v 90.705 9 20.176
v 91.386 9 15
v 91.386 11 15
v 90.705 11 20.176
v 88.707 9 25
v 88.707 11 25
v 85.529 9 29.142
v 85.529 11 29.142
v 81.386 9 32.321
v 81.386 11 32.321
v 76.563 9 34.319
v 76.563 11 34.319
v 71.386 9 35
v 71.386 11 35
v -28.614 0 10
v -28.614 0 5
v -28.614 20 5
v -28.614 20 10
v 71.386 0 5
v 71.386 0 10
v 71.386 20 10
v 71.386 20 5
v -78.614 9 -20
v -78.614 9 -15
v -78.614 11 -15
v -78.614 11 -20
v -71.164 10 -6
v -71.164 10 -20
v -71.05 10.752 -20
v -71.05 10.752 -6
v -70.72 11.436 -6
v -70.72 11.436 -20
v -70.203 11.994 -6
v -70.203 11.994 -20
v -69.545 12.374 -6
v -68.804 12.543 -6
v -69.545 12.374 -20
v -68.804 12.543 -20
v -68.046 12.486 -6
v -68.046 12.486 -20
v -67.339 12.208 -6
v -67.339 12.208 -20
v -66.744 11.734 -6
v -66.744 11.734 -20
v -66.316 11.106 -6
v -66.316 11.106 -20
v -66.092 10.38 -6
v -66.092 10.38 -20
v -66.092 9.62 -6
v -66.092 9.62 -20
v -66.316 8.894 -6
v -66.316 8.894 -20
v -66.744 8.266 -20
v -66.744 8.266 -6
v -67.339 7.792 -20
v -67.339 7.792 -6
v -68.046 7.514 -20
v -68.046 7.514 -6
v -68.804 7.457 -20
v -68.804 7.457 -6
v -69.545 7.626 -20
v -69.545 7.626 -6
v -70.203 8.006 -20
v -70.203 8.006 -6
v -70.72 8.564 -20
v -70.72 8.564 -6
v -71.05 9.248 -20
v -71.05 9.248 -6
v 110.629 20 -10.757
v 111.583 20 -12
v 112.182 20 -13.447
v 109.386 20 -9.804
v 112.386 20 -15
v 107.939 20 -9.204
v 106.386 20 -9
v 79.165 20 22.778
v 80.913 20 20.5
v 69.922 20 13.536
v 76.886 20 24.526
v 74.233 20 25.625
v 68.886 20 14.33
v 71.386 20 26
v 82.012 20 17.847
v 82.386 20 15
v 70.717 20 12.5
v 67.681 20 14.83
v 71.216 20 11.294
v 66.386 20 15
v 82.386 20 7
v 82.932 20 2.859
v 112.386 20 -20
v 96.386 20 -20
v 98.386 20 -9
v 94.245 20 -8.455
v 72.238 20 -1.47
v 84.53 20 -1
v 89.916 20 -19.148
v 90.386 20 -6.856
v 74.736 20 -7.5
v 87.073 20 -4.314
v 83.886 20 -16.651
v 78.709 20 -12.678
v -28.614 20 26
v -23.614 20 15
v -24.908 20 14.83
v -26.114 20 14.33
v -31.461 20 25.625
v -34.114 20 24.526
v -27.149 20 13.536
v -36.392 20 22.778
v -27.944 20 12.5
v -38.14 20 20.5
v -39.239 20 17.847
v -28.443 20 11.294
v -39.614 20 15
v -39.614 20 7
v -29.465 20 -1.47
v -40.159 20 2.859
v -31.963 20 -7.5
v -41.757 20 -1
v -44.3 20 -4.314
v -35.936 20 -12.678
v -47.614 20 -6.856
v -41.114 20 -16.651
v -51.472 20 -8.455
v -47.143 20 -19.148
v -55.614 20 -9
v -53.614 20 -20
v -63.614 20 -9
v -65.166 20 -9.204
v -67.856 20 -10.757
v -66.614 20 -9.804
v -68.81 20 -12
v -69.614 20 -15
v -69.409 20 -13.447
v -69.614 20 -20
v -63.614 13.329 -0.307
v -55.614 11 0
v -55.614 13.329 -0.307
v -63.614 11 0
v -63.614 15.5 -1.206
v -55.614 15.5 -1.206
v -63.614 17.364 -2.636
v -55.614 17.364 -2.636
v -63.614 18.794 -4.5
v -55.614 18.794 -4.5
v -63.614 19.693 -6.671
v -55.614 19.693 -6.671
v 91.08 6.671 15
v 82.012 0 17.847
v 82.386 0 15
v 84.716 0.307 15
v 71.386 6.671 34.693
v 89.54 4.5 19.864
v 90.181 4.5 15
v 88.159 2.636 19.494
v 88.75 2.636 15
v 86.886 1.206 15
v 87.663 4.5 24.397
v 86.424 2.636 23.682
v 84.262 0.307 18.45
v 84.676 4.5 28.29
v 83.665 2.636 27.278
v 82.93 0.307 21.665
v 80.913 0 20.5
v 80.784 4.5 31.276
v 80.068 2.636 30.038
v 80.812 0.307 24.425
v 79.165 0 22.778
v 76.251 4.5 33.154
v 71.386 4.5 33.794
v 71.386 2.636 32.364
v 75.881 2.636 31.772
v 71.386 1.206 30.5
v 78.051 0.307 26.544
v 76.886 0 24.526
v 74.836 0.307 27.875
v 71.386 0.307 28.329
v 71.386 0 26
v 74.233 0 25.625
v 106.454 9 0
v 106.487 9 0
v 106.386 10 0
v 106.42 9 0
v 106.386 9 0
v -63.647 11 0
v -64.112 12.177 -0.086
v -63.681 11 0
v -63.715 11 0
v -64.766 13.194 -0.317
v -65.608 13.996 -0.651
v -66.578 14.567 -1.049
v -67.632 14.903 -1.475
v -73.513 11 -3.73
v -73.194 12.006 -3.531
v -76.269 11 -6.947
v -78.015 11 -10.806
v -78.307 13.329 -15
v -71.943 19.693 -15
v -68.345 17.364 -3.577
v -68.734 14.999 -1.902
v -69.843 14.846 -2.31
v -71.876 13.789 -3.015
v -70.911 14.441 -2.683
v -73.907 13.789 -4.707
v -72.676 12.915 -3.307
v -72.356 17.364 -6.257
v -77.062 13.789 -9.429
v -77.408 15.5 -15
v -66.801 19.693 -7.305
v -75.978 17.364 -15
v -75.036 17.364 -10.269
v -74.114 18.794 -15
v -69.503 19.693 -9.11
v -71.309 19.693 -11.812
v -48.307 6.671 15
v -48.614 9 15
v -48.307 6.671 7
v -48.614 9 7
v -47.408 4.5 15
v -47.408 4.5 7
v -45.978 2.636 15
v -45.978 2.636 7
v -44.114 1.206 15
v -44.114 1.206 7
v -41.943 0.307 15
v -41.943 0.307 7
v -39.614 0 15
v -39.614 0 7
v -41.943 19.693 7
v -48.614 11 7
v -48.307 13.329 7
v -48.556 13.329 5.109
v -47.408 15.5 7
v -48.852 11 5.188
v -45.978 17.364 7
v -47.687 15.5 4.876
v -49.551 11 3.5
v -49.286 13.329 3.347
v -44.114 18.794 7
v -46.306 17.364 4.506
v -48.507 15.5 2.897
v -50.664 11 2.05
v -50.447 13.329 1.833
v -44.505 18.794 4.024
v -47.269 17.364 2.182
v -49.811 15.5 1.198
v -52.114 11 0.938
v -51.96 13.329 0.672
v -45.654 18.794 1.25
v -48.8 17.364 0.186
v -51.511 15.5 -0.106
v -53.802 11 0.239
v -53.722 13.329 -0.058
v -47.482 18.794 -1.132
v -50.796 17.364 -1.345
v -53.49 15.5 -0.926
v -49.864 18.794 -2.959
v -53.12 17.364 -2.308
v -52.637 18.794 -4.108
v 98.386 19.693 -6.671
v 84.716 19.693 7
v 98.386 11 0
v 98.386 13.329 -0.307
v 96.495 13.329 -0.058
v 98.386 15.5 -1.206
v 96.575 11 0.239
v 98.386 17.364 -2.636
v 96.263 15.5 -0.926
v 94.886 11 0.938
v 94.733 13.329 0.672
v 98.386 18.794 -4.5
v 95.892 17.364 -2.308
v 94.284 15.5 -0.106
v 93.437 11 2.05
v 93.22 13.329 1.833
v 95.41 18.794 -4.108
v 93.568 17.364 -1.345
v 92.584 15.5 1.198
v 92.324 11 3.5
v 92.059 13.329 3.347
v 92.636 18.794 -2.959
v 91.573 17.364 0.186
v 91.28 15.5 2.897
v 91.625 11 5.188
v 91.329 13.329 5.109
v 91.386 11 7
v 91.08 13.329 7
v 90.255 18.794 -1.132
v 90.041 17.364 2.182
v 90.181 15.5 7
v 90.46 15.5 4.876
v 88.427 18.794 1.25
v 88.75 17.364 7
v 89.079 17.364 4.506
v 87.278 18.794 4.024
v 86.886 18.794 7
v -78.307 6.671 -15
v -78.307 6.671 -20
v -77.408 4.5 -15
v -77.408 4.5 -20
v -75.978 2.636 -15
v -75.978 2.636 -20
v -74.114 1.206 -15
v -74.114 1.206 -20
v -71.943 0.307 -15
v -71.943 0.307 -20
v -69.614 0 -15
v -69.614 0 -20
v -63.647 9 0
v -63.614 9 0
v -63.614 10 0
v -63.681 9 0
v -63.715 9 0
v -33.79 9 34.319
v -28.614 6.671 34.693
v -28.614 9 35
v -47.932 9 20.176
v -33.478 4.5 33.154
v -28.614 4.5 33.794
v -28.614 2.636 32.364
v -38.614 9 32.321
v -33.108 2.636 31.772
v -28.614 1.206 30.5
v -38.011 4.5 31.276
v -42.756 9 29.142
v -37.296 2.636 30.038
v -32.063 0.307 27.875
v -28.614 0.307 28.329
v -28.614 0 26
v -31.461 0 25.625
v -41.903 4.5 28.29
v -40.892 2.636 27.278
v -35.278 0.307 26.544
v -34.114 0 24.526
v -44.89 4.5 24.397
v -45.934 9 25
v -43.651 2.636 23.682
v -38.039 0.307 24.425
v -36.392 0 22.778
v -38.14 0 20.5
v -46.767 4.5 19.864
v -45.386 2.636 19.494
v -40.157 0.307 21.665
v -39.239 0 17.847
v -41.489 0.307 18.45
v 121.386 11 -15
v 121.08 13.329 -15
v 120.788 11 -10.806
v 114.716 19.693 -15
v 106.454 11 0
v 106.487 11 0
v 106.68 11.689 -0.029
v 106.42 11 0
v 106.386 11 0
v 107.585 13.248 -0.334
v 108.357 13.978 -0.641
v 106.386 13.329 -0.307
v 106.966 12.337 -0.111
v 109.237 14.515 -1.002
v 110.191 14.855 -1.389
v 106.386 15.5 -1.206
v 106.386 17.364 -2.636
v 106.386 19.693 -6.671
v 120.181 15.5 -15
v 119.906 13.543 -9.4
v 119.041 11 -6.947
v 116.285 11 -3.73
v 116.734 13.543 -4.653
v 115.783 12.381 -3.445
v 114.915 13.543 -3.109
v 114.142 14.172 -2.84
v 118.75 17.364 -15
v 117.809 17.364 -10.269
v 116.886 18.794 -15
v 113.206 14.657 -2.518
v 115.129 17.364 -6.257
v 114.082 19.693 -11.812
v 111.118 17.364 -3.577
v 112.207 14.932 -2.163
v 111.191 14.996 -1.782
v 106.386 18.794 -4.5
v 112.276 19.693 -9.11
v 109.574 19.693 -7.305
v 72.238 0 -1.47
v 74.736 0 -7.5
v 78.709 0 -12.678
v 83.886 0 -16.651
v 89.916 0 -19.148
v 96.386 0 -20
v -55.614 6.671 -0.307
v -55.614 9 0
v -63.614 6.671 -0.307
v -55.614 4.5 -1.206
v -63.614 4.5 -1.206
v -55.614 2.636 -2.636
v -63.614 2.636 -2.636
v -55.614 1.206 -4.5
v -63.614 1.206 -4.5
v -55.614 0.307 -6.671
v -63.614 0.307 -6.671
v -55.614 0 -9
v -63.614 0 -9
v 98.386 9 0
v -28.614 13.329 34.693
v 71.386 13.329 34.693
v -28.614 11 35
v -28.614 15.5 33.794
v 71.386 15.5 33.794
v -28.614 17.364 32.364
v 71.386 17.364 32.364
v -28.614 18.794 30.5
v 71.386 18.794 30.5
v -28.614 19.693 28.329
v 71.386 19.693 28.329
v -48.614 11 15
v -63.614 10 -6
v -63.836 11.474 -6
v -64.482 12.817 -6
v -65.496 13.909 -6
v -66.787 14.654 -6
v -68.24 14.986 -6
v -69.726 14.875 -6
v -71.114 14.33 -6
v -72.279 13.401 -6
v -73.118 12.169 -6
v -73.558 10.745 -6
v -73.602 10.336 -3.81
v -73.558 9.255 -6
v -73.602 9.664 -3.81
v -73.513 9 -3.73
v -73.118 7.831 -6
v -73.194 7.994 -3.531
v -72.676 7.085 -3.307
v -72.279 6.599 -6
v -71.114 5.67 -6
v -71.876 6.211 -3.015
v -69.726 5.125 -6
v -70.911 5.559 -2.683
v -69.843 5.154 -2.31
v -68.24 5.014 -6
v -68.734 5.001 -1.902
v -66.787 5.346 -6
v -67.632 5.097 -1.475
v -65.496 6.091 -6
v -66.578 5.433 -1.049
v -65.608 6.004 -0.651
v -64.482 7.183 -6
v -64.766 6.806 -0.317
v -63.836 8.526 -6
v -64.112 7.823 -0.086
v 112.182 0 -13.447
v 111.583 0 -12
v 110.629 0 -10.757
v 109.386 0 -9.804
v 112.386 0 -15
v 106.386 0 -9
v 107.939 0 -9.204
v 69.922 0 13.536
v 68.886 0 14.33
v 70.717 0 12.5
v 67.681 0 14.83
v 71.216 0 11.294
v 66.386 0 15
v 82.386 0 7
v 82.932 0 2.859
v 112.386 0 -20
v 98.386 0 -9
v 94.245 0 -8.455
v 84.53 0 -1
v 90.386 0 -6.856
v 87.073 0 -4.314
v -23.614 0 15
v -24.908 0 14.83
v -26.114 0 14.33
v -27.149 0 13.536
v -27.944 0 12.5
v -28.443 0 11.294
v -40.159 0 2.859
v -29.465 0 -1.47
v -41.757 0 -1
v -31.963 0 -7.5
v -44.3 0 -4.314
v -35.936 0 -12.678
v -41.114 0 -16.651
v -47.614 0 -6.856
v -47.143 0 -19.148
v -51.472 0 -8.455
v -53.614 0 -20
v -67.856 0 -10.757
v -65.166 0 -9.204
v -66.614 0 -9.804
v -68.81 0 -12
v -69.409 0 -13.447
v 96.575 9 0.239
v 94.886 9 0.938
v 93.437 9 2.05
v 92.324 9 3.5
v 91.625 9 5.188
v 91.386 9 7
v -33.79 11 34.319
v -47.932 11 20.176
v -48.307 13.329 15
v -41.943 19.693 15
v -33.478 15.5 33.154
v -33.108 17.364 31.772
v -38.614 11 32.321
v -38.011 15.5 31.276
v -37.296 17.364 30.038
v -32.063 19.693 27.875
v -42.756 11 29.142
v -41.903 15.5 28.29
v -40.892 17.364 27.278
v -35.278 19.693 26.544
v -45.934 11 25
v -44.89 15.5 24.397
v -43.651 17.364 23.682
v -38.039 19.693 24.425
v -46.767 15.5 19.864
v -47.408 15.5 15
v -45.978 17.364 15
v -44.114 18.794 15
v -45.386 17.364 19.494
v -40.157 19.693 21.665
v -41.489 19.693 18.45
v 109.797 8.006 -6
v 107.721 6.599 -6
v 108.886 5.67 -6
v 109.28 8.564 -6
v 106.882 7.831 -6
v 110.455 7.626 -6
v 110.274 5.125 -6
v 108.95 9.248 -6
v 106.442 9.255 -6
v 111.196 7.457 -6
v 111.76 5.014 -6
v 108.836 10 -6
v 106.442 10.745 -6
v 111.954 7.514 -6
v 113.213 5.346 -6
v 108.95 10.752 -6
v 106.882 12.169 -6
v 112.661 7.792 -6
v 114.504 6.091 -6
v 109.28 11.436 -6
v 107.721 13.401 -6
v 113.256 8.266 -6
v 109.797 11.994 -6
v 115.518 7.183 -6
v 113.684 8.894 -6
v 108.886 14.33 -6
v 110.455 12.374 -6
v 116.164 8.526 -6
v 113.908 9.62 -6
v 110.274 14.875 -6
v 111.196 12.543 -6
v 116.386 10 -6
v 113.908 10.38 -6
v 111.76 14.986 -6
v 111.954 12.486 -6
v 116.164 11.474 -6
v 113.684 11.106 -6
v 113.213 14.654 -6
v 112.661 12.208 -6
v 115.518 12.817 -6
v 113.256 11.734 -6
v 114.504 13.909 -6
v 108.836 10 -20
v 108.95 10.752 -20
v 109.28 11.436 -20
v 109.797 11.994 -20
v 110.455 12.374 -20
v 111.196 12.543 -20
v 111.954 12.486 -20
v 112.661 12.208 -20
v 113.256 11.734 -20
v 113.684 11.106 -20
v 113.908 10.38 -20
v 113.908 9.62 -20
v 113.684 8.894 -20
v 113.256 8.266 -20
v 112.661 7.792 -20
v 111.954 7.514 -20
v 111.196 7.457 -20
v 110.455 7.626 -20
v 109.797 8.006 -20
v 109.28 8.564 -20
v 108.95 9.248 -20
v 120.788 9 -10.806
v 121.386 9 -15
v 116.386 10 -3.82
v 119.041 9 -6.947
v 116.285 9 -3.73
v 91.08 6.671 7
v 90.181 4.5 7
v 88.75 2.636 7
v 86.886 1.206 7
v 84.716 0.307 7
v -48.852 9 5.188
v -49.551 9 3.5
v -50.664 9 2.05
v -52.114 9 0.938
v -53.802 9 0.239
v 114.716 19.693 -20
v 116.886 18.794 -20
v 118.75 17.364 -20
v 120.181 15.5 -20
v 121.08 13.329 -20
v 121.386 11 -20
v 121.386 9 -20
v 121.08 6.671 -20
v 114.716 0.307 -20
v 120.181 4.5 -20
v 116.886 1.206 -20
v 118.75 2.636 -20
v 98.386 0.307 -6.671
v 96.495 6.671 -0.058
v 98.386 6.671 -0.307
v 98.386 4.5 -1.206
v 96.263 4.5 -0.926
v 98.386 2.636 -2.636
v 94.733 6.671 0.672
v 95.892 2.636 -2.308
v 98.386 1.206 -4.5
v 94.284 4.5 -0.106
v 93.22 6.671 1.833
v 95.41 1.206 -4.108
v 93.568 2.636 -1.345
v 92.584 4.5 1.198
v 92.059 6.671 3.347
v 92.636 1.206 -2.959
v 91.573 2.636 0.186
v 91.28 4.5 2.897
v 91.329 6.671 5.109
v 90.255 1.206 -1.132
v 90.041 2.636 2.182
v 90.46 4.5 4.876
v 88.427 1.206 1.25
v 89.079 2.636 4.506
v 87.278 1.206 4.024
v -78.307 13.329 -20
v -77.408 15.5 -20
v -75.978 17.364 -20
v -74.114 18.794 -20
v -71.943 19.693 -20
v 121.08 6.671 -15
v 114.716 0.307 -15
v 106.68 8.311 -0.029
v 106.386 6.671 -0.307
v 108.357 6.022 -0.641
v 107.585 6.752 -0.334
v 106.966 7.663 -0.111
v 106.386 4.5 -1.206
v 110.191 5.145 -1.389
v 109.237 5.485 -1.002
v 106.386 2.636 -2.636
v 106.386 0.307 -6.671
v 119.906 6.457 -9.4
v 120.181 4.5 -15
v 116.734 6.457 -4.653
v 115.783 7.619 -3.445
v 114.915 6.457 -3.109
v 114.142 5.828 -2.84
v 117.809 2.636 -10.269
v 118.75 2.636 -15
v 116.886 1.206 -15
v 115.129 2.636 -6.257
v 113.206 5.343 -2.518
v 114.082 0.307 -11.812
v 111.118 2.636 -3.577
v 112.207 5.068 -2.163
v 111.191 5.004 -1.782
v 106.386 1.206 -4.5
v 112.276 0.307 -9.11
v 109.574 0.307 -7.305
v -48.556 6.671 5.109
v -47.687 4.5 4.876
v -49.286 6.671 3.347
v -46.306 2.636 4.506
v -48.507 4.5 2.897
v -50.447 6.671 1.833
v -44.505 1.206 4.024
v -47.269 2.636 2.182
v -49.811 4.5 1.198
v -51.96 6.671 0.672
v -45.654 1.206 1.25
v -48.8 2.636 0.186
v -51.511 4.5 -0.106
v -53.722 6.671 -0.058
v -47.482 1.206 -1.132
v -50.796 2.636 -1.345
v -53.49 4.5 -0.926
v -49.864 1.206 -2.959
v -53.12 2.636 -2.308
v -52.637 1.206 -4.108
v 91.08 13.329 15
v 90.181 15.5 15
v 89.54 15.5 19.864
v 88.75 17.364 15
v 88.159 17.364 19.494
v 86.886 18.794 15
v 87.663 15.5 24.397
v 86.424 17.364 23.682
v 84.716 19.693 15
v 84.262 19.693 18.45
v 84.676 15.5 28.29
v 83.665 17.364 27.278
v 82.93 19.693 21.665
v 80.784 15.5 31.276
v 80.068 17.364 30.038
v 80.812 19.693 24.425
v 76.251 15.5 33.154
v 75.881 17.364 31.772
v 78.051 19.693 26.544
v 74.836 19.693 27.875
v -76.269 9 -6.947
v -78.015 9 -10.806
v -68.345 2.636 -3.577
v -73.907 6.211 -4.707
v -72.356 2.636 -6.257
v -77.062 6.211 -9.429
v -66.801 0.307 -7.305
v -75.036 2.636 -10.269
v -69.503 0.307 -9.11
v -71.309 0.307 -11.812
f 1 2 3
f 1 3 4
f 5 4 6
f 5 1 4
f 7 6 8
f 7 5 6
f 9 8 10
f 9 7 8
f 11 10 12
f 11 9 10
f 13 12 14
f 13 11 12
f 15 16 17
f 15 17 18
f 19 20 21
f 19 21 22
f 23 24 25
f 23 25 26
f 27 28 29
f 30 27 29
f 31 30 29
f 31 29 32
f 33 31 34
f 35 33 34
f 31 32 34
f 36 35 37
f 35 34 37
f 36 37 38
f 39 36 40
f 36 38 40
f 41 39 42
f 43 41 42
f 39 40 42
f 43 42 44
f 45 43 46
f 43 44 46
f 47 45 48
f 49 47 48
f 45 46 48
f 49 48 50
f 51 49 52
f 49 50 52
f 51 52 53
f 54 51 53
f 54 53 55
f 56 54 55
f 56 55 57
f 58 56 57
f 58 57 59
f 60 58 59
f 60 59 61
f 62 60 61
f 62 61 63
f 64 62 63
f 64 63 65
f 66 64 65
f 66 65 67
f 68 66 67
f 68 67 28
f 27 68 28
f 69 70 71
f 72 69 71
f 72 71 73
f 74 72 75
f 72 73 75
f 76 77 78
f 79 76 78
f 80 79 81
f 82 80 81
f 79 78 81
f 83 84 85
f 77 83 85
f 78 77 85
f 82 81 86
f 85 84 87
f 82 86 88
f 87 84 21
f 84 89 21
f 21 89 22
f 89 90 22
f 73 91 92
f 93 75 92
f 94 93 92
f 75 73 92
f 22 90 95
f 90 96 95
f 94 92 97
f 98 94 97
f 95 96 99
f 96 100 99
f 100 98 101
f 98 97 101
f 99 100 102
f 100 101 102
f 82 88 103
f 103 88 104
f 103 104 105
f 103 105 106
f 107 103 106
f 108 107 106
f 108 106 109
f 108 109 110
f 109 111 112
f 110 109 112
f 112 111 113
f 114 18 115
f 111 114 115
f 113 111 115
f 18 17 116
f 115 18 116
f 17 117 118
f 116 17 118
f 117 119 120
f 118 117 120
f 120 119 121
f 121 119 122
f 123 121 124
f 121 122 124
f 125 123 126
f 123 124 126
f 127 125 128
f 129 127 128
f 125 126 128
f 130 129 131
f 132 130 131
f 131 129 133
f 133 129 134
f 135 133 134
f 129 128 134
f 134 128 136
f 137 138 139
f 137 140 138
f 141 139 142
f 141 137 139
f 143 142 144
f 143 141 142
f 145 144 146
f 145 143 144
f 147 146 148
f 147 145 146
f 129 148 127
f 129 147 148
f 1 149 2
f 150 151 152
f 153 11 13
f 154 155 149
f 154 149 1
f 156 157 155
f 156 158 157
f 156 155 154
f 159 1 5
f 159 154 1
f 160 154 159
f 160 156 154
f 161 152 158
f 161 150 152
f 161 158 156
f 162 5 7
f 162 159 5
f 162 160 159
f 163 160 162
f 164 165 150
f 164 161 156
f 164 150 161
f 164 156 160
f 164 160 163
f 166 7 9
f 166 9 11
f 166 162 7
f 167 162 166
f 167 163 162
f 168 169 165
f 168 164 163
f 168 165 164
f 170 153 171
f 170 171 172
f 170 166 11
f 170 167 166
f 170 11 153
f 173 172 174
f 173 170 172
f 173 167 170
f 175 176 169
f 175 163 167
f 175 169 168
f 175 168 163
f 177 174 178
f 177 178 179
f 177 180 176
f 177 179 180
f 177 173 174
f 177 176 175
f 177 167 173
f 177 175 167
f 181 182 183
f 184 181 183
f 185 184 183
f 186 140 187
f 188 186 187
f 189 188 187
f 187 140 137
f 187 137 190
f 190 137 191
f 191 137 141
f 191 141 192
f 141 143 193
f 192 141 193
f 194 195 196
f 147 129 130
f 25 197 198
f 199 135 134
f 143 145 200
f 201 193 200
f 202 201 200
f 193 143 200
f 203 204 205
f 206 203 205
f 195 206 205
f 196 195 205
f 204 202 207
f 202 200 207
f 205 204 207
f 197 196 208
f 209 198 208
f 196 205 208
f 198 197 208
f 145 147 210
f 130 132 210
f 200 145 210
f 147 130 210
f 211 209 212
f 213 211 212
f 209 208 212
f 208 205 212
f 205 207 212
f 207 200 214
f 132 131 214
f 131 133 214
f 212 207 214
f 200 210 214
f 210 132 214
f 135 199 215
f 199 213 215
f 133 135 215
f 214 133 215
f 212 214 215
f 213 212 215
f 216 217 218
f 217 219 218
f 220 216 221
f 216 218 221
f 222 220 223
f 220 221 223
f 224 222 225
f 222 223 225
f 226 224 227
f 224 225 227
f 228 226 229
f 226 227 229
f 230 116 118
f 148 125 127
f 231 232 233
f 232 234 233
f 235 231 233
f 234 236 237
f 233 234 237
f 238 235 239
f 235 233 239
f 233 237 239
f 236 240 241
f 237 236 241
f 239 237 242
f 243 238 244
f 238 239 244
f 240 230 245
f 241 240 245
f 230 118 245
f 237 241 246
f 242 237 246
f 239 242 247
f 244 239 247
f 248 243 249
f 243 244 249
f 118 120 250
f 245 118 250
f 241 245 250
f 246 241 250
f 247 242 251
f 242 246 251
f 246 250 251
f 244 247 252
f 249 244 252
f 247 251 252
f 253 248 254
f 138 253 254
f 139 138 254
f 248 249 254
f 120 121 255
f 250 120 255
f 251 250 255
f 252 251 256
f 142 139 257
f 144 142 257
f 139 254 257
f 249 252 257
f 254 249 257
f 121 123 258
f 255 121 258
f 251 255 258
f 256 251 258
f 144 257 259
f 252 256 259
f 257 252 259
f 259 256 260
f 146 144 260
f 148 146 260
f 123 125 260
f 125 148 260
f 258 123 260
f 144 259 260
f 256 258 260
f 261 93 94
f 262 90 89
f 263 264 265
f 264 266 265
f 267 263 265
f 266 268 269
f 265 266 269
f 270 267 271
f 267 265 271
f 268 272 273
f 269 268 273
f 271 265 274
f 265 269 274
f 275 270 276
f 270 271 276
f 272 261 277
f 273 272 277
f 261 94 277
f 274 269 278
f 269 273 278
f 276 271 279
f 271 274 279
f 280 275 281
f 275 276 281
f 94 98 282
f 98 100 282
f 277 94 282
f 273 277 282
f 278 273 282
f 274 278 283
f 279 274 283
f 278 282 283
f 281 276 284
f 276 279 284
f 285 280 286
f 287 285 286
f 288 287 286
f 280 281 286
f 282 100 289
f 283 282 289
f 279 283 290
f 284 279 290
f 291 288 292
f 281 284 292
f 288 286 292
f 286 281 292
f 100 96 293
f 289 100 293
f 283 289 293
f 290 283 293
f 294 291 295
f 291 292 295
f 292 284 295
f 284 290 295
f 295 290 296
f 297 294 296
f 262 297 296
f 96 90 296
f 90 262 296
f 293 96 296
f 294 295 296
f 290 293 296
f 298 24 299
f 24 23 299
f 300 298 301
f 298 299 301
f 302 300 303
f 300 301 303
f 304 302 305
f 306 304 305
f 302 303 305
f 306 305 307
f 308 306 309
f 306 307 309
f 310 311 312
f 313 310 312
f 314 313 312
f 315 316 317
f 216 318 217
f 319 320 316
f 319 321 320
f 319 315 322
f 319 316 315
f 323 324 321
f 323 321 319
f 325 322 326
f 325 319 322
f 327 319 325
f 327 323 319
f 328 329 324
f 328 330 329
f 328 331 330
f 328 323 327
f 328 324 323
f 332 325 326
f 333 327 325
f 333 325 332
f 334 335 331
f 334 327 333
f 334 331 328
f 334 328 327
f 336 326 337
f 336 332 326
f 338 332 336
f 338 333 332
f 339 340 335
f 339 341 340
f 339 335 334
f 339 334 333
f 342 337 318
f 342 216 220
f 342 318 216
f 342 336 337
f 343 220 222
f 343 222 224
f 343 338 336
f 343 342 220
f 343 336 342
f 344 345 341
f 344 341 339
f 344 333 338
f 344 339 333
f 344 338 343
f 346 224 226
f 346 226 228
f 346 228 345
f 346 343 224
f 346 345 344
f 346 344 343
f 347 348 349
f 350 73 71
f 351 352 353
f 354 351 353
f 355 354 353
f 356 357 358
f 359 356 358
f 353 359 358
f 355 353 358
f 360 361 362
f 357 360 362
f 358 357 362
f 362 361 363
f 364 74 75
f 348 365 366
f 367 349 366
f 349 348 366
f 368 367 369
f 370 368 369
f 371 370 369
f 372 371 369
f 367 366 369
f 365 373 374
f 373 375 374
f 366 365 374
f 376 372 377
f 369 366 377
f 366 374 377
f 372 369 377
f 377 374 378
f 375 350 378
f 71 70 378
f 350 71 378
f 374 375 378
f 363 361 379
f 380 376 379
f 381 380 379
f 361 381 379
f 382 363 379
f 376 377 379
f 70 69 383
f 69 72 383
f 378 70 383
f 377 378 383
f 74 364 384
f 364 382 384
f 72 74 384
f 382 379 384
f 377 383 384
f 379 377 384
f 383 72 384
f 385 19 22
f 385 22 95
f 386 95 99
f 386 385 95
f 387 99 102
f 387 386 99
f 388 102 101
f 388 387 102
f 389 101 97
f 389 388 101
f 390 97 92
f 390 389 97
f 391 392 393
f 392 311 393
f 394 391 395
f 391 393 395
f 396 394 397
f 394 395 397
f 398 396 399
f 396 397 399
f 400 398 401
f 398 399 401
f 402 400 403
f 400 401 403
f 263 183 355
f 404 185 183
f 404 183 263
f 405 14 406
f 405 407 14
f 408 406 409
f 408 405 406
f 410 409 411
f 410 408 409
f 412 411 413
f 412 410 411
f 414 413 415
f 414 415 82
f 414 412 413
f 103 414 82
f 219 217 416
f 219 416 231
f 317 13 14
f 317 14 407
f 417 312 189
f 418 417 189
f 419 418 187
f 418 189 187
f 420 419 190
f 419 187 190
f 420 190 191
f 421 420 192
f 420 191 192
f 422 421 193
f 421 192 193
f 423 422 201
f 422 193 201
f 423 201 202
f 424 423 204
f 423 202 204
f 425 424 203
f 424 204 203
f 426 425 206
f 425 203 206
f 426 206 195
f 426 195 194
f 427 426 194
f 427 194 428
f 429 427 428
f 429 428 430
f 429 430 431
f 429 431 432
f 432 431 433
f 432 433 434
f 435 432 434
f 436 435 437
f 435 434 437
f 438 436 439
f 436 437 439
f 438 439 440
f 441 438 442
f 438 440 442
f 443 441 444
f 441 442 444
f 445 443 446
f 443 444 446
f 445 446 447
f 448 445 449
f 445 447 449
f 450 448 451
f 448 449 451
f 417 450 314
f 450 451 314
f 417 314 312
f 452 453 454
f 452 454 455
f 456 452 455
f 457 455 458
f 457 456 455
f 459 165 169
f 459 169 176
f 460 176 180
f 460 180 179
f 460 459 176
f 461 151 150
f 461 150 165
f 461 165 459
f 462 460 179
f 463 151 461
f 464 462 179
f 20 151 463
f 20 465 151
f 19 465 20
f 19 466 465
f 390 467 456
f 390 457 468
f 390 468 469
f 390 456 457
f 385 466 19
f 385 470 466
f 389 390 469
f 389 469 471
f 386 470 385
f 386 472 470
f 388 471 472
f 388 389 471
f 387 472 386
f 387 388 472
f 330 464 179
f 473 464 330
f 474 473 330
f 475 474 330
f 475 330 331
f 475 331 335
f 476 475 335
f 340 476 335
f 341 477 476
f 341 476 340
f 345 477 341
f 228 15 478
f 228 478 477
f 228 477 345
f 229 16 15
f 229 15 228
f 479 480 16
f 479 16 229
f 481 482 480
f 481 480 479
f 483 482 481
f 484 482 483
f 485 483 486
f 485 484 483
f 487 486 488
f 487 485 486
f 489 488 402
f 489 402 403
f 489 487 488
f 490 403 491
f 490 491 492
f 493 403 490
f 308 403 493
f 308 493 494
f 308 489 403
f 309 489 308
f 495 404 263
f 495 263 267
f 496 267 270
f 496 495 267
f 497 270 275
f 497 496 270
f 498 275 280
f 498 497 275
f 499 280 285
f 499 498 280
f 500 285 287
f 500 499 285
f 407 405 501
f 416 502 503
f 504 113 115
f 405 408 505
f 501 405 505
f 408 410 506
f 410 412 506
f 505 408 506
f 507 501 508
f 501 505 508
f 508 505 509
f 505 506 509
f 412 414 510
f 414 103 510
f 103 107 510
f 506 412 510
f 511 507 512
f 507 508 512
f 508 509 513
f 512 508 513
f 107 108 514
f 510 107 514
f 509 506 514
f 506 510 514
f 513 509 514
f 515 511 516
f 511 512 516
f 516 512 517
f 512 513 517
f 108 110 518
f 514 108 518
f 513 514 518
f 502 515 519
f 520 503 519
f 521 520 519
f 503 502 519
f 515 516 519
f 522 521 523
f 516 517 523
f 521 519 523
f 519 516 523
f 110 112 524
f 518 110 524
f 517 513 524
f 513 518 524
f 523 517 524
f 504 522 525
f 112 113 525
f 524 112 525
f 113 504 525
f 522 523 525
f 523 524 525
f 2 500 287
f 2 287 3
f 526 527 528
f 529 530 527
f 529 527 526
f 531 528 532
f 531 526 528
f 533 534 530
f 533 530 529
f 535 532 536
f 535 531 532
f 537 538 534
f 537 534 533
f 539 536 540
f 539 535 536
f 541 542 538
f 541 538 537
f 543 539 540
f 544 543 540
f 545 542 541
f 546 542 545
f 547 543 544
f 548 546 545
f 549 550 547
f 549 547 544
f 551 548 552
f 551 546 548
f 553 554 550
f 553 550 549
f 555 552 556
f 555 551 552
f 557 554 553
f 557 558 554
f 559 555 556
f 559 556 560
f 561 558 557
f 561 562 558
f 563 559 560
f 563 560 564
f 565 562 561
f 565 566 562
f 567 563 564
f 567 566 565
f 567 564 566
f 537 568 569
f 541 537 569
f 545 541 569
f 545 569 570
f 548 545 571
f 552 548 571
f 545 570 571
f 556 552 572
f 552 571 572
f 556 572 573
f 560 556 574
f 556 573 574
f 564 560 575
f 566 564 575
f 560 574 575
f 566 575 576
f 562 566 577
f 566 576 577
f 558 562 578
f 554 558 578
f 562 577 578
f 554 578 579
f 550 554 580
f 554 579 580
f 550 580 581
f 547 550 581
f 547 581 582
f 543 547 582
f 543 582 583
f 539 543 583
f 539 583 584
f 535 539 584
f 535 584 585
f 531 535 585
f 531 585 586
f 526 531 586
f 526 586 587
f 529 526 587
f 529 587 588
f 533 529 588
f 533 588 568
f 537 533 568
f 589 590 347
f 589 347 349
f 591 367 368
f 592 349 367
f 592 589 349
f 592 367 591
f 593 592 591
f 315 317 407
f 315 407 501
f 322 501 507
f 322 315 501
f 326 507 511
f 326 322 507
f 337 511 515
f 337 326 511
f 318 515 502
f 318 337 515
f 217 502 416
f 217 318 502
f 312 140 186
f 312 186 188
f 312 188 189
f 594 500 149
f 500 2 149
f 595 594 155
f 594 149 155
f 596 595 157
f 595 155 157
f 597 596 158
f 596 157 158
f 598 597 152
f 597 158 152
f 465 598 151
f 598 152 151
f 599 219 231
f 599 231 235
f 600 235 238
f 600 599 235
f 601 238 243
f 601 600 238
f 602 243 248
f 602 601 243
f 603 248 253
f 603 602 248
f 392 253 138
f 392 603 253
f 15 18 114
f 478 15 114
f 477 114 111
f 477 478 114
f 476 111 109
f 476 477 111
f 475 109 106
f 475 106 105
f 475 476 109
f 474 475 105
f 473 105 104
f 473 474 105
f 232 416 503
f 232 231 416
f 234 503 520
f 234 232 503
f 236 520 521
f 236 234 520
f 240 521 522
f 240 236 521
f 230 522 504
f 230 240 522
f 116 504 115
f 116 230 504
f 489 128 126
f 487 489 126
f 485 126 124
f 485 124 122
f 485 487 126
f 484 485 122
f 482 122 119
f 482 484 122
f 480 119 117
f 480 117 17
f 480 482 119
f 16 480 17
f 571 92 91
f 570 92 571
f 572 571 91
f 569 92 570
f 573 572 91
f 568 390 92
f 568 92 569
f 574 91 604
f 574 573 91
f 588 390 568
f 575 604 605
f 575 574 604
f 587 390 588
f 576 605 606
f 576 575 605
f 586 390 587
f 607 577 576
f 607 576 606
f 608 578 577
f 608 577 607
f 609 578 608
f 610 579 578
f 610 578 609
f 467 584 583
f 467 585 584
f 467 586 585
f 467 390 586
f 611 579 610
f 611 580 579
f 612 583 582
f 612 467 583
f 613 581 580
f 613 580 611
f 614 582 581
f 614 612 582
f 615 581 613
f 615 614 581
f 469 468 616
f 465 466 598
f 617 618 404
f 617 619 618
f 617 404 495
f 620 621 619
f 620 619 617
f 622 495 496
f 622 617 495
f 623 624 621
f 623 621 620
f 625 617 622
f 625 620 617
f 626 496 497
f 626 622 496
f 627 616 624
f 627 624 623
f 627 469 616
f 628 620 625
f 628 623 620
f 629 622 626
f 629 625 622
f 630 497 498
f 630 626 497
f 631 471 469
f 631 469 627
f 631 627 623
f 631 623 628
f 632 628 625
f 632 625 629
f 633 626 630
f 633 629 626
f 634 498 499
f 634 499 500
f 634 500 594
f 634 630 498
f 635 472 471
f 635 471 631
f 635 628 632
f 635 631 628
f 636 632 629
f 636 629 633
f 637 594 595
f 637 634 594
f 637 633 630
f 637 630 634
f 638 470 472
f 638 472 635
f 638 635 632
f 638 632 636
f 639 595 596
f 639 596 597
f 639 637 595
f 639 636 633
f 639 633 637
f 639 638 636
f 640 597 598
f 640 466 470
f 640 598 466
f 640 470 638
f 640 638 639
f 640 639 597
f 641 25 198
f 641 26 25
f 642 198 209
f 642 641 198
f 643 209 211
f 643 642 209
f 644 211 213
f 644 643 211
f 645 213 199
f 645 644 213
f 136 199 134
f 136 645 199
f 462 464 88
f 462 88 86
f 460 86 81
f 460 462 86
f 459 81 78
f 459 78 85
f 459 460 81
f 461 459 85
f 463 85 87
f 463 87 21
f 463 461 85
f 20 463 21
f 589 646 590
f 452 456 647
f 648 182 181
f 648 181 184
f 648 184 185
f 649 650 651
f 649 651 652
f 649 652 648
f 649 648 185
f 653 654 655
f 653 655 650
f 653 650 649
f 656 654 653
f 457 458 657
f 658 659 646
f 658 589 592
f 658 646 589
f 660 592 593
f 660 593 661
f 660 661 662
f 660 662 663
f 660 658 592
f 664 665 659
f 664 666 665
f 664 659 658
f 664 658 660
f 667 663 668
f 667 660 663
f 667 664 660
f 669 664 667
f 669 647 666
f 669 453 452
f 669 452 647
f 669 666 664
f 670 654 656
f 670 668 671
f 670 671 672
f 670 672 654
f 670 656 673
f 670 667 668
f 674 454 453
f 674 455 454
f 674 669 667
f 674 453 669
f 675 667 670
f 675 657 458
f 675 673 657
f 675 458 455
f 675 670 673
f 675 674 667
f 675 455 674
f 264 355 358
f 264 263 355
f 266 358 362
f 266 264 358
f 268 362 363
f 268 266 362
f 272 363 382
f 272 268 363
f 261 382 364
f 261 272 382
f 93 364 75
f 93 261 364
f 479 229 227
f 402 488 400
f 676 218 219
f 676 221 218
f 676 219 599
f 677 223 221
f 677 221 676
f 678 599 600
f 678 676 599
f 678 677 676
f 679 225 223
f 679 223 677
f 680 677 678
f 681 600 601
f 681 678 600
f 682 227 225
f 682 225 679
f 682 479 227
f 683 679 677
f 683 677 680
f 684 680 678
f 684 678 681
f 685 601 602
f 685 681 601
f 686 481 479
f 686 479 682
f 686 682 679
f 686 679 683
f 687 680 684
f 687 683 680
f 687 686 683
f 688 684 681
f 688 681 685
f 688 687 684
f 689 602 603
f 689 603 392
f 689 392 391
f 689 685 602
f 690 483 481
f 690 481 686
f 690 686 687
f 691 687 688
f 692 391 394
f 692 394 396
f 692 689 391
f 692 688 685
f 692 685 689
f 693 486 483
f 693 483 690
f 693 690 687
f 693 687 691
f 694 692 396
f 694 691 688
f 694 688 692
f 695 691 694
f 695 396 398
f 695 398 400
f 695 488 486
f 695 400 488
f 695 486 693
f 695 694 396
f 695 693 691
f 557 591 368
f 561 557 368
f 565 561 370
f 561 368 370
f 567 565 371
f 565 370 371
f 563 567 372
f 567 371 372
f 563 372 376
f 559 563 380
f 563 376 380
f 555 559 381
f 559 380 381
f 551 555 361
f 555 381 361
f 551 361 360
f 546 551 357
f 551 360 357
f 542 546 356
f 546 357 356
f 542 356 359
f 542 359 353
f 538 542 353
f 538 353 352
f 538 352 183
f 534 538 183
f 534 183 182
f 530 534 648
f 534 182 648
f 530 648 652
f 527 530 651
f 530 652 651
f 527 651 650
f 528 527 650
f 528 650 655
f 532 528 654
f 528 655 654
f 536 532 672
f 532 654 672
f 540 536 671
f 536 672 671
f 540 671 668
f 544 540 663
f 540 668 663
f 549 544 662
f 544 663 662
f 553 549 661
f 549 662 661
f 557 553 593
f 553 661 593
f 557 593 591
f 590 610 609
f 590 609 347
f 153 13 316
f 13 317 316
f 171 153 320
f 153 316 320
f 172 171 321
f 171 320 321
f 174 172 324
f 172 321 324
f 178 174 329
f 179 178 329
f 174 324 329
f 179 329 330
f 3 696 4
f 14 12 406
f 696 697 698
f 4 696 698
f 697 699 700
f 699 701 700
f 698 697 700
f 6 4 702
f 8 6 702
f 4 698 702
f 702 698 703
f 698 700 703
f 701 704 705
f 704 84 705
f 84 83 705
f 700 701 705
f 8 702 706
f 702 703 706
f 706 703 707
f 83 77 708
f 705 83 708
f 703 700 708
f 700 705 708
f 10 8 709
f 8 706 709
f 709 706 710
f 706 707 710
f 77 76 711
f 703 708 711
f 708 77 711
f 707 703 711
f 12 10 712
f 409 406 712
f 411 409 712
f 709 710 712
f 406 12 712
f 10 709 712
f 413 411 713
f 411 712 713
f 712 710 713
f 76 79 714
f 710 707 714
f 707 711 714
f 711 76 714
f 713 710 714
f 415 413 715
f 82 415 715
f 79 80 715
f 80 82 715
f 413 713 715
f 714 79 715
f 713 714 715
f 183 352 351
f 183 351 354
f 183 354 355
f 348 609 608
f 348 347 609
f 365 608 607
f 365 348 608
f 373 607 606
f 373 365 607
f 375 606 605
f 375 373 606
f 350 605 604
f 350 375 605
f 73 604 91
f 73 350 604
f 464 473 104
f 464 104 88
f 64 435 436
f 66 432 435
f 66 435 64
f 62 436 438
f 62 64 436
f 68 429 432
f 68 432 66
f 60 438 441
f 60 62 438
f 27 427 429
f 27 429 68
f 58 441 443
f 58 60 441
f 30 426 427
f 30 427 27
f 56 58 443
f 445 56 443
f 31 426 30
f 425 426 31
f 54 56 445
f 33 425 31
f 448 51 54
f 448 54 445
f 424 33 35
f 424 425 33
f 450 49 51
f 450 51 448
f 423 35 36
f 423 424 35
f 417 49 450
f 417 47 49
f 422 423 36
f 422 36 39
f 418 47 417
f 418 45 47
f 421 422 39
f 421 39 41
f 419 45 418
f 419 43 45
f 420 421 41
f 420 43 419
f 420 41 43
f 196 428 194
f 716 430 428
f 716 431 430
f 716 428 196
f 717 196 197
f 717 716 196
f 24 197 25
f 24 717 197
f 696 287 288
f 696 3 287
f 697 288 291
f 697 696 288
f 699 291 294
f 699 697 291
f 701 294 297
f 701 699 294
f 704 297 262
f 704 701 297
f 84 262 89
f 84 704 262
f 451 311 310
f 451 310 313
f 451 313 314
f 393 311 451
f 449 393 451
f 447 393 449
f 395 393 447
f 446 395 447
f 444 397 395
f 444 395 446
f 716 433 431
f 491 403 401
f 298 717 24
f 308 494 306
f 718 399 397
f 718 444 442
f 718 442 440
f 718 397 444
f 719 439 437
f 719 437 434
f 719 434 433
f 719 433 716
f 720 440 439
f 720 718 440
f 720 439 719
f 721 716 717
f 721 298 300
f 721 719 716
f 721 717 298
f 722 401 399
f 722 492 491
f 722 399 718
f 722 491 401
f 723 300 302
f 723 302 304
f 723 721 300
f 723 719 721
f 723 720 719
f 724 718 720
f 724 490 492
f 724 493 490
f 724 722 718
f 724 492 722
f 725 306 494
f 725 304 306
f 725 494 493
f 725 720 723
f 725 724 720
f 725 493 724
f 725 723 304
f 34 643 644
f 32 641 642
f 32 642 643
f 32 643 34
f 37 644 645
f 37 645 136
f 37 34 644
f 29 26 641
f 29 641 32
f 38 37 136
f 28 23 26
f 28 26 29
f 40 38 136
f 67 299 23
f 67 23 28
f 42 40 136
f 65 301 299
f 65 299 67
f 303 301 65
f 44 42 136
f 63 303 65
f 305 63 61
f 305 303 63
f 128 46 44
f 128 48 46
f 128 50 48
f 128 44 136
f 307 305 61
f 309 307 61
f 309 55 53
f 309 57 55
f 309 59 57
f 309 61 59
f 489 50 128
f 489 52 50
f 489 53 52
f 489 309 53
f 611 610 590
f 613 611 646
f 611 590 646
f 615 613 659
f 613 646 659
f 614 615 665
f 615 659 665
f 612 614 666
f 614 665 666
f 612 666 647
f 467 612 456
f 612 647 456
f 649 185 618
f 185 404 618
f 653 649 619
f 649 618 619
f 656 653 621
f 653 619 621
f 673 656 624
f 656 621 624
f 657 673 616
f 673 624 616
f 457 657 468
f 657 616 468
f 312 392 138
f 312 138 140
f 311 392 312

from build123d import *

# Parameters (mm, degrees)
EXTRUDE_1_DEPTH     = 20
FILLET_1_R          = 9
SKETCH_2_R          = 2.55
CUT_EXTRUDE_1_DEPTH = 135.75780331
SKETCH_3_R          = 5
CUT_EXTRUDE_2_DEPTH = 6


with BuildPart() as part:
    # Эскиз1 → Бобышка-Вытянуть1 (new body)
    with BuildSketch(Plane(origin=(0, 0, 0), x_dir=(1, 0, 0), z_dir=(0, 1, 0))):
        with BuildLine():
            Line((-78.613569322, 20), (-53.613569322, 20))
            ThreePointArc((-53.613569322, 20), (-35.935899792, 12.67766953), (-28.613569322, -5))
            Line((-28.613569322, -5), (-28.613569322, -10))
            ThreePointArc((-28.613569322, -10), (-27.149103227, -13.535533906), (-23.613569322, -15))
            Line((-23.613569322, -15), (66.386430678, -15))
            ThreePointArc((66.386430678, -15), (69.921964584, -13.535533906), (71.386430678, -10))
            Line((71.386430678, -10), (71.386430678, -5))
            ThreePointArc((71.386430678, -5), (78.708761149, 12.67766953), (96.386430678, 20))
            Line((96.386430678, 20), (121.386430678, 20))
            Line((121.386430678, 20), (121.386430678, 15))
            ThreePointArc((121.386430678, 15), (116.993032396, 4.393398282), (106.386430678, 0))
            Line((106.386430678, 0), (98.386430678, 0))
            ThreePointArc((98.386430678, 0), (93.43668321, -2.050252532), (91.386430678, -7))
            Line((91.386430678, -7), (91.386430678, -15))
            ThreePointArc((91.386430678, -15), (85.528566302, -29.142135624), (71.386430678, -35))
            Line((71.386430678, -35), (-28.613569322, -35))
            ThreePointArc((-28.613569322, -35), (-42.755704945, -29.142135624), (-48.613569322, -15))
            Line((-48.613569322, -15), (-48.613569322, -7))
            ThreePointArc((-48.613569322, -7), (-50.663821853, -2.050252532), (-55.613569322, 0))
            Line((-55.613569322, 0), (-63.613569322, 0))
            ThreePointArc((-63.613569322, 0), (-74.220171039, 4.393398282), (-78.613569322, 15))
            Line((-78.613569322, 15), (-78.613569322, 20))
        make_face()
    extrude(amount=EXTRUDE_1_DEPTH)

    # Скругление1
    fillet_1_edges = [part.edges().sort_by_distance(p)[0] for p in [
        (-59.613569322, 20, 0),
        (-50.663821853, 20, 2.050252532),
        (-48.613569322, 20, 11),
        (-42.755704945, 20, 29.142135624),
        (21.386430678, 20, 35),
        (121.386430678, 0, -17.5),
        (116.993032396, 0, -4.393398282),
        (102.386430678, 0, 0),
        (93.43668321, 0, 2.050252532),
        (91.386430678, 0, 11),
        (85.528566302, 0, 29.142135624),
        (21.386430678, 0, 35),
        (85.528566302, 20, 29.142135624),
        (-42.755704945, 0, 29.142135624),
        (-48.613569322, 0, 11),
        (-50.663821853, 0, 2.050252532),
        (-59.613569322, 0, 0),
        (-74.220171039, 0, -4.393398282),
        (-78.613569322, 0, -17.5),
        (91.386430678, 20, 11),
        (93.43668321, 20, 2.050252532),
        (102.386430678, 20, 0),
        (116.993032396, 20, -4.393398282),
        (-78.613569322, 20, -17.5),
        (121.386430678, 20, -17.5),
        (-74.220171039, 20, -4.393398282),
    ]]
    fillet(fillet_1_edges, radius=FILLET_1_R)

    # Эскиз2 → Вырез-Вытянуть1 (cut, through all)
    with BuildSketch(Plane(origin=(0, 0, -20), x_dir=(-1, 0, 0), z_dir=(0, 0, -1))):
        with Locations((-111.386430678, 10)):
            Circle(SKETCH_2_R)
        with Locations((68.613569322, 10)):
            Circle(SKETCH_2_R)
    extrude(amount=-CUT_EXTRUDE_1_DEPTH, mode=Mode.SUBTRACT)

    # Эскиз3 → Вырез-Вытянуть2 (cut)
    with BuildSketch(Plane.XY):
        with Locations((-68.613569322, 10)):
            Circle(SKETCH_3_R)
        with Locations((111.386430678, 10)):
            Circle(SKETCH_3_R)
    extrude(amount=-CUT_EXTRUDE_2_DEPTH, mode=Mode.SUBTRACT)


solid = part.part
